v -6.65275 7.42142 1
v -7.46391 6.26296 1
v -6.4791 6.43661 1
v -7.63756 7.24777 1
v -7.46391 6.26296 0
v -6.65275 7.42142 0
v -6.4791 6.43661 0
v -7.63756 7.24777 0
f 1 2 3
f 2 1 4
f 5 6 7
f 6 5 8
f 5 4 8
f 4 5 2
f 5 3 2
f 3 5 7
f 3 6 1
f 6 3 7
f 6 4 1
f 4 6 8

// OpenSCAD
// Deep Recursion - Test Fixture
// A module that calls itself `steps` times. The browser engine runs out of
// stack long before desktop OpenSCAD does, so the default fails in every
// browser and a small value works everywhere.

/*[Recursion]*/
steps = 400; // [1:1:1000]

module step(n) {
    if (n > 0)
        translate([1, 0, 0]) rotate([0, 0, 7]) step(n - 1);
    else
        cube(1);
}

step(steps);
